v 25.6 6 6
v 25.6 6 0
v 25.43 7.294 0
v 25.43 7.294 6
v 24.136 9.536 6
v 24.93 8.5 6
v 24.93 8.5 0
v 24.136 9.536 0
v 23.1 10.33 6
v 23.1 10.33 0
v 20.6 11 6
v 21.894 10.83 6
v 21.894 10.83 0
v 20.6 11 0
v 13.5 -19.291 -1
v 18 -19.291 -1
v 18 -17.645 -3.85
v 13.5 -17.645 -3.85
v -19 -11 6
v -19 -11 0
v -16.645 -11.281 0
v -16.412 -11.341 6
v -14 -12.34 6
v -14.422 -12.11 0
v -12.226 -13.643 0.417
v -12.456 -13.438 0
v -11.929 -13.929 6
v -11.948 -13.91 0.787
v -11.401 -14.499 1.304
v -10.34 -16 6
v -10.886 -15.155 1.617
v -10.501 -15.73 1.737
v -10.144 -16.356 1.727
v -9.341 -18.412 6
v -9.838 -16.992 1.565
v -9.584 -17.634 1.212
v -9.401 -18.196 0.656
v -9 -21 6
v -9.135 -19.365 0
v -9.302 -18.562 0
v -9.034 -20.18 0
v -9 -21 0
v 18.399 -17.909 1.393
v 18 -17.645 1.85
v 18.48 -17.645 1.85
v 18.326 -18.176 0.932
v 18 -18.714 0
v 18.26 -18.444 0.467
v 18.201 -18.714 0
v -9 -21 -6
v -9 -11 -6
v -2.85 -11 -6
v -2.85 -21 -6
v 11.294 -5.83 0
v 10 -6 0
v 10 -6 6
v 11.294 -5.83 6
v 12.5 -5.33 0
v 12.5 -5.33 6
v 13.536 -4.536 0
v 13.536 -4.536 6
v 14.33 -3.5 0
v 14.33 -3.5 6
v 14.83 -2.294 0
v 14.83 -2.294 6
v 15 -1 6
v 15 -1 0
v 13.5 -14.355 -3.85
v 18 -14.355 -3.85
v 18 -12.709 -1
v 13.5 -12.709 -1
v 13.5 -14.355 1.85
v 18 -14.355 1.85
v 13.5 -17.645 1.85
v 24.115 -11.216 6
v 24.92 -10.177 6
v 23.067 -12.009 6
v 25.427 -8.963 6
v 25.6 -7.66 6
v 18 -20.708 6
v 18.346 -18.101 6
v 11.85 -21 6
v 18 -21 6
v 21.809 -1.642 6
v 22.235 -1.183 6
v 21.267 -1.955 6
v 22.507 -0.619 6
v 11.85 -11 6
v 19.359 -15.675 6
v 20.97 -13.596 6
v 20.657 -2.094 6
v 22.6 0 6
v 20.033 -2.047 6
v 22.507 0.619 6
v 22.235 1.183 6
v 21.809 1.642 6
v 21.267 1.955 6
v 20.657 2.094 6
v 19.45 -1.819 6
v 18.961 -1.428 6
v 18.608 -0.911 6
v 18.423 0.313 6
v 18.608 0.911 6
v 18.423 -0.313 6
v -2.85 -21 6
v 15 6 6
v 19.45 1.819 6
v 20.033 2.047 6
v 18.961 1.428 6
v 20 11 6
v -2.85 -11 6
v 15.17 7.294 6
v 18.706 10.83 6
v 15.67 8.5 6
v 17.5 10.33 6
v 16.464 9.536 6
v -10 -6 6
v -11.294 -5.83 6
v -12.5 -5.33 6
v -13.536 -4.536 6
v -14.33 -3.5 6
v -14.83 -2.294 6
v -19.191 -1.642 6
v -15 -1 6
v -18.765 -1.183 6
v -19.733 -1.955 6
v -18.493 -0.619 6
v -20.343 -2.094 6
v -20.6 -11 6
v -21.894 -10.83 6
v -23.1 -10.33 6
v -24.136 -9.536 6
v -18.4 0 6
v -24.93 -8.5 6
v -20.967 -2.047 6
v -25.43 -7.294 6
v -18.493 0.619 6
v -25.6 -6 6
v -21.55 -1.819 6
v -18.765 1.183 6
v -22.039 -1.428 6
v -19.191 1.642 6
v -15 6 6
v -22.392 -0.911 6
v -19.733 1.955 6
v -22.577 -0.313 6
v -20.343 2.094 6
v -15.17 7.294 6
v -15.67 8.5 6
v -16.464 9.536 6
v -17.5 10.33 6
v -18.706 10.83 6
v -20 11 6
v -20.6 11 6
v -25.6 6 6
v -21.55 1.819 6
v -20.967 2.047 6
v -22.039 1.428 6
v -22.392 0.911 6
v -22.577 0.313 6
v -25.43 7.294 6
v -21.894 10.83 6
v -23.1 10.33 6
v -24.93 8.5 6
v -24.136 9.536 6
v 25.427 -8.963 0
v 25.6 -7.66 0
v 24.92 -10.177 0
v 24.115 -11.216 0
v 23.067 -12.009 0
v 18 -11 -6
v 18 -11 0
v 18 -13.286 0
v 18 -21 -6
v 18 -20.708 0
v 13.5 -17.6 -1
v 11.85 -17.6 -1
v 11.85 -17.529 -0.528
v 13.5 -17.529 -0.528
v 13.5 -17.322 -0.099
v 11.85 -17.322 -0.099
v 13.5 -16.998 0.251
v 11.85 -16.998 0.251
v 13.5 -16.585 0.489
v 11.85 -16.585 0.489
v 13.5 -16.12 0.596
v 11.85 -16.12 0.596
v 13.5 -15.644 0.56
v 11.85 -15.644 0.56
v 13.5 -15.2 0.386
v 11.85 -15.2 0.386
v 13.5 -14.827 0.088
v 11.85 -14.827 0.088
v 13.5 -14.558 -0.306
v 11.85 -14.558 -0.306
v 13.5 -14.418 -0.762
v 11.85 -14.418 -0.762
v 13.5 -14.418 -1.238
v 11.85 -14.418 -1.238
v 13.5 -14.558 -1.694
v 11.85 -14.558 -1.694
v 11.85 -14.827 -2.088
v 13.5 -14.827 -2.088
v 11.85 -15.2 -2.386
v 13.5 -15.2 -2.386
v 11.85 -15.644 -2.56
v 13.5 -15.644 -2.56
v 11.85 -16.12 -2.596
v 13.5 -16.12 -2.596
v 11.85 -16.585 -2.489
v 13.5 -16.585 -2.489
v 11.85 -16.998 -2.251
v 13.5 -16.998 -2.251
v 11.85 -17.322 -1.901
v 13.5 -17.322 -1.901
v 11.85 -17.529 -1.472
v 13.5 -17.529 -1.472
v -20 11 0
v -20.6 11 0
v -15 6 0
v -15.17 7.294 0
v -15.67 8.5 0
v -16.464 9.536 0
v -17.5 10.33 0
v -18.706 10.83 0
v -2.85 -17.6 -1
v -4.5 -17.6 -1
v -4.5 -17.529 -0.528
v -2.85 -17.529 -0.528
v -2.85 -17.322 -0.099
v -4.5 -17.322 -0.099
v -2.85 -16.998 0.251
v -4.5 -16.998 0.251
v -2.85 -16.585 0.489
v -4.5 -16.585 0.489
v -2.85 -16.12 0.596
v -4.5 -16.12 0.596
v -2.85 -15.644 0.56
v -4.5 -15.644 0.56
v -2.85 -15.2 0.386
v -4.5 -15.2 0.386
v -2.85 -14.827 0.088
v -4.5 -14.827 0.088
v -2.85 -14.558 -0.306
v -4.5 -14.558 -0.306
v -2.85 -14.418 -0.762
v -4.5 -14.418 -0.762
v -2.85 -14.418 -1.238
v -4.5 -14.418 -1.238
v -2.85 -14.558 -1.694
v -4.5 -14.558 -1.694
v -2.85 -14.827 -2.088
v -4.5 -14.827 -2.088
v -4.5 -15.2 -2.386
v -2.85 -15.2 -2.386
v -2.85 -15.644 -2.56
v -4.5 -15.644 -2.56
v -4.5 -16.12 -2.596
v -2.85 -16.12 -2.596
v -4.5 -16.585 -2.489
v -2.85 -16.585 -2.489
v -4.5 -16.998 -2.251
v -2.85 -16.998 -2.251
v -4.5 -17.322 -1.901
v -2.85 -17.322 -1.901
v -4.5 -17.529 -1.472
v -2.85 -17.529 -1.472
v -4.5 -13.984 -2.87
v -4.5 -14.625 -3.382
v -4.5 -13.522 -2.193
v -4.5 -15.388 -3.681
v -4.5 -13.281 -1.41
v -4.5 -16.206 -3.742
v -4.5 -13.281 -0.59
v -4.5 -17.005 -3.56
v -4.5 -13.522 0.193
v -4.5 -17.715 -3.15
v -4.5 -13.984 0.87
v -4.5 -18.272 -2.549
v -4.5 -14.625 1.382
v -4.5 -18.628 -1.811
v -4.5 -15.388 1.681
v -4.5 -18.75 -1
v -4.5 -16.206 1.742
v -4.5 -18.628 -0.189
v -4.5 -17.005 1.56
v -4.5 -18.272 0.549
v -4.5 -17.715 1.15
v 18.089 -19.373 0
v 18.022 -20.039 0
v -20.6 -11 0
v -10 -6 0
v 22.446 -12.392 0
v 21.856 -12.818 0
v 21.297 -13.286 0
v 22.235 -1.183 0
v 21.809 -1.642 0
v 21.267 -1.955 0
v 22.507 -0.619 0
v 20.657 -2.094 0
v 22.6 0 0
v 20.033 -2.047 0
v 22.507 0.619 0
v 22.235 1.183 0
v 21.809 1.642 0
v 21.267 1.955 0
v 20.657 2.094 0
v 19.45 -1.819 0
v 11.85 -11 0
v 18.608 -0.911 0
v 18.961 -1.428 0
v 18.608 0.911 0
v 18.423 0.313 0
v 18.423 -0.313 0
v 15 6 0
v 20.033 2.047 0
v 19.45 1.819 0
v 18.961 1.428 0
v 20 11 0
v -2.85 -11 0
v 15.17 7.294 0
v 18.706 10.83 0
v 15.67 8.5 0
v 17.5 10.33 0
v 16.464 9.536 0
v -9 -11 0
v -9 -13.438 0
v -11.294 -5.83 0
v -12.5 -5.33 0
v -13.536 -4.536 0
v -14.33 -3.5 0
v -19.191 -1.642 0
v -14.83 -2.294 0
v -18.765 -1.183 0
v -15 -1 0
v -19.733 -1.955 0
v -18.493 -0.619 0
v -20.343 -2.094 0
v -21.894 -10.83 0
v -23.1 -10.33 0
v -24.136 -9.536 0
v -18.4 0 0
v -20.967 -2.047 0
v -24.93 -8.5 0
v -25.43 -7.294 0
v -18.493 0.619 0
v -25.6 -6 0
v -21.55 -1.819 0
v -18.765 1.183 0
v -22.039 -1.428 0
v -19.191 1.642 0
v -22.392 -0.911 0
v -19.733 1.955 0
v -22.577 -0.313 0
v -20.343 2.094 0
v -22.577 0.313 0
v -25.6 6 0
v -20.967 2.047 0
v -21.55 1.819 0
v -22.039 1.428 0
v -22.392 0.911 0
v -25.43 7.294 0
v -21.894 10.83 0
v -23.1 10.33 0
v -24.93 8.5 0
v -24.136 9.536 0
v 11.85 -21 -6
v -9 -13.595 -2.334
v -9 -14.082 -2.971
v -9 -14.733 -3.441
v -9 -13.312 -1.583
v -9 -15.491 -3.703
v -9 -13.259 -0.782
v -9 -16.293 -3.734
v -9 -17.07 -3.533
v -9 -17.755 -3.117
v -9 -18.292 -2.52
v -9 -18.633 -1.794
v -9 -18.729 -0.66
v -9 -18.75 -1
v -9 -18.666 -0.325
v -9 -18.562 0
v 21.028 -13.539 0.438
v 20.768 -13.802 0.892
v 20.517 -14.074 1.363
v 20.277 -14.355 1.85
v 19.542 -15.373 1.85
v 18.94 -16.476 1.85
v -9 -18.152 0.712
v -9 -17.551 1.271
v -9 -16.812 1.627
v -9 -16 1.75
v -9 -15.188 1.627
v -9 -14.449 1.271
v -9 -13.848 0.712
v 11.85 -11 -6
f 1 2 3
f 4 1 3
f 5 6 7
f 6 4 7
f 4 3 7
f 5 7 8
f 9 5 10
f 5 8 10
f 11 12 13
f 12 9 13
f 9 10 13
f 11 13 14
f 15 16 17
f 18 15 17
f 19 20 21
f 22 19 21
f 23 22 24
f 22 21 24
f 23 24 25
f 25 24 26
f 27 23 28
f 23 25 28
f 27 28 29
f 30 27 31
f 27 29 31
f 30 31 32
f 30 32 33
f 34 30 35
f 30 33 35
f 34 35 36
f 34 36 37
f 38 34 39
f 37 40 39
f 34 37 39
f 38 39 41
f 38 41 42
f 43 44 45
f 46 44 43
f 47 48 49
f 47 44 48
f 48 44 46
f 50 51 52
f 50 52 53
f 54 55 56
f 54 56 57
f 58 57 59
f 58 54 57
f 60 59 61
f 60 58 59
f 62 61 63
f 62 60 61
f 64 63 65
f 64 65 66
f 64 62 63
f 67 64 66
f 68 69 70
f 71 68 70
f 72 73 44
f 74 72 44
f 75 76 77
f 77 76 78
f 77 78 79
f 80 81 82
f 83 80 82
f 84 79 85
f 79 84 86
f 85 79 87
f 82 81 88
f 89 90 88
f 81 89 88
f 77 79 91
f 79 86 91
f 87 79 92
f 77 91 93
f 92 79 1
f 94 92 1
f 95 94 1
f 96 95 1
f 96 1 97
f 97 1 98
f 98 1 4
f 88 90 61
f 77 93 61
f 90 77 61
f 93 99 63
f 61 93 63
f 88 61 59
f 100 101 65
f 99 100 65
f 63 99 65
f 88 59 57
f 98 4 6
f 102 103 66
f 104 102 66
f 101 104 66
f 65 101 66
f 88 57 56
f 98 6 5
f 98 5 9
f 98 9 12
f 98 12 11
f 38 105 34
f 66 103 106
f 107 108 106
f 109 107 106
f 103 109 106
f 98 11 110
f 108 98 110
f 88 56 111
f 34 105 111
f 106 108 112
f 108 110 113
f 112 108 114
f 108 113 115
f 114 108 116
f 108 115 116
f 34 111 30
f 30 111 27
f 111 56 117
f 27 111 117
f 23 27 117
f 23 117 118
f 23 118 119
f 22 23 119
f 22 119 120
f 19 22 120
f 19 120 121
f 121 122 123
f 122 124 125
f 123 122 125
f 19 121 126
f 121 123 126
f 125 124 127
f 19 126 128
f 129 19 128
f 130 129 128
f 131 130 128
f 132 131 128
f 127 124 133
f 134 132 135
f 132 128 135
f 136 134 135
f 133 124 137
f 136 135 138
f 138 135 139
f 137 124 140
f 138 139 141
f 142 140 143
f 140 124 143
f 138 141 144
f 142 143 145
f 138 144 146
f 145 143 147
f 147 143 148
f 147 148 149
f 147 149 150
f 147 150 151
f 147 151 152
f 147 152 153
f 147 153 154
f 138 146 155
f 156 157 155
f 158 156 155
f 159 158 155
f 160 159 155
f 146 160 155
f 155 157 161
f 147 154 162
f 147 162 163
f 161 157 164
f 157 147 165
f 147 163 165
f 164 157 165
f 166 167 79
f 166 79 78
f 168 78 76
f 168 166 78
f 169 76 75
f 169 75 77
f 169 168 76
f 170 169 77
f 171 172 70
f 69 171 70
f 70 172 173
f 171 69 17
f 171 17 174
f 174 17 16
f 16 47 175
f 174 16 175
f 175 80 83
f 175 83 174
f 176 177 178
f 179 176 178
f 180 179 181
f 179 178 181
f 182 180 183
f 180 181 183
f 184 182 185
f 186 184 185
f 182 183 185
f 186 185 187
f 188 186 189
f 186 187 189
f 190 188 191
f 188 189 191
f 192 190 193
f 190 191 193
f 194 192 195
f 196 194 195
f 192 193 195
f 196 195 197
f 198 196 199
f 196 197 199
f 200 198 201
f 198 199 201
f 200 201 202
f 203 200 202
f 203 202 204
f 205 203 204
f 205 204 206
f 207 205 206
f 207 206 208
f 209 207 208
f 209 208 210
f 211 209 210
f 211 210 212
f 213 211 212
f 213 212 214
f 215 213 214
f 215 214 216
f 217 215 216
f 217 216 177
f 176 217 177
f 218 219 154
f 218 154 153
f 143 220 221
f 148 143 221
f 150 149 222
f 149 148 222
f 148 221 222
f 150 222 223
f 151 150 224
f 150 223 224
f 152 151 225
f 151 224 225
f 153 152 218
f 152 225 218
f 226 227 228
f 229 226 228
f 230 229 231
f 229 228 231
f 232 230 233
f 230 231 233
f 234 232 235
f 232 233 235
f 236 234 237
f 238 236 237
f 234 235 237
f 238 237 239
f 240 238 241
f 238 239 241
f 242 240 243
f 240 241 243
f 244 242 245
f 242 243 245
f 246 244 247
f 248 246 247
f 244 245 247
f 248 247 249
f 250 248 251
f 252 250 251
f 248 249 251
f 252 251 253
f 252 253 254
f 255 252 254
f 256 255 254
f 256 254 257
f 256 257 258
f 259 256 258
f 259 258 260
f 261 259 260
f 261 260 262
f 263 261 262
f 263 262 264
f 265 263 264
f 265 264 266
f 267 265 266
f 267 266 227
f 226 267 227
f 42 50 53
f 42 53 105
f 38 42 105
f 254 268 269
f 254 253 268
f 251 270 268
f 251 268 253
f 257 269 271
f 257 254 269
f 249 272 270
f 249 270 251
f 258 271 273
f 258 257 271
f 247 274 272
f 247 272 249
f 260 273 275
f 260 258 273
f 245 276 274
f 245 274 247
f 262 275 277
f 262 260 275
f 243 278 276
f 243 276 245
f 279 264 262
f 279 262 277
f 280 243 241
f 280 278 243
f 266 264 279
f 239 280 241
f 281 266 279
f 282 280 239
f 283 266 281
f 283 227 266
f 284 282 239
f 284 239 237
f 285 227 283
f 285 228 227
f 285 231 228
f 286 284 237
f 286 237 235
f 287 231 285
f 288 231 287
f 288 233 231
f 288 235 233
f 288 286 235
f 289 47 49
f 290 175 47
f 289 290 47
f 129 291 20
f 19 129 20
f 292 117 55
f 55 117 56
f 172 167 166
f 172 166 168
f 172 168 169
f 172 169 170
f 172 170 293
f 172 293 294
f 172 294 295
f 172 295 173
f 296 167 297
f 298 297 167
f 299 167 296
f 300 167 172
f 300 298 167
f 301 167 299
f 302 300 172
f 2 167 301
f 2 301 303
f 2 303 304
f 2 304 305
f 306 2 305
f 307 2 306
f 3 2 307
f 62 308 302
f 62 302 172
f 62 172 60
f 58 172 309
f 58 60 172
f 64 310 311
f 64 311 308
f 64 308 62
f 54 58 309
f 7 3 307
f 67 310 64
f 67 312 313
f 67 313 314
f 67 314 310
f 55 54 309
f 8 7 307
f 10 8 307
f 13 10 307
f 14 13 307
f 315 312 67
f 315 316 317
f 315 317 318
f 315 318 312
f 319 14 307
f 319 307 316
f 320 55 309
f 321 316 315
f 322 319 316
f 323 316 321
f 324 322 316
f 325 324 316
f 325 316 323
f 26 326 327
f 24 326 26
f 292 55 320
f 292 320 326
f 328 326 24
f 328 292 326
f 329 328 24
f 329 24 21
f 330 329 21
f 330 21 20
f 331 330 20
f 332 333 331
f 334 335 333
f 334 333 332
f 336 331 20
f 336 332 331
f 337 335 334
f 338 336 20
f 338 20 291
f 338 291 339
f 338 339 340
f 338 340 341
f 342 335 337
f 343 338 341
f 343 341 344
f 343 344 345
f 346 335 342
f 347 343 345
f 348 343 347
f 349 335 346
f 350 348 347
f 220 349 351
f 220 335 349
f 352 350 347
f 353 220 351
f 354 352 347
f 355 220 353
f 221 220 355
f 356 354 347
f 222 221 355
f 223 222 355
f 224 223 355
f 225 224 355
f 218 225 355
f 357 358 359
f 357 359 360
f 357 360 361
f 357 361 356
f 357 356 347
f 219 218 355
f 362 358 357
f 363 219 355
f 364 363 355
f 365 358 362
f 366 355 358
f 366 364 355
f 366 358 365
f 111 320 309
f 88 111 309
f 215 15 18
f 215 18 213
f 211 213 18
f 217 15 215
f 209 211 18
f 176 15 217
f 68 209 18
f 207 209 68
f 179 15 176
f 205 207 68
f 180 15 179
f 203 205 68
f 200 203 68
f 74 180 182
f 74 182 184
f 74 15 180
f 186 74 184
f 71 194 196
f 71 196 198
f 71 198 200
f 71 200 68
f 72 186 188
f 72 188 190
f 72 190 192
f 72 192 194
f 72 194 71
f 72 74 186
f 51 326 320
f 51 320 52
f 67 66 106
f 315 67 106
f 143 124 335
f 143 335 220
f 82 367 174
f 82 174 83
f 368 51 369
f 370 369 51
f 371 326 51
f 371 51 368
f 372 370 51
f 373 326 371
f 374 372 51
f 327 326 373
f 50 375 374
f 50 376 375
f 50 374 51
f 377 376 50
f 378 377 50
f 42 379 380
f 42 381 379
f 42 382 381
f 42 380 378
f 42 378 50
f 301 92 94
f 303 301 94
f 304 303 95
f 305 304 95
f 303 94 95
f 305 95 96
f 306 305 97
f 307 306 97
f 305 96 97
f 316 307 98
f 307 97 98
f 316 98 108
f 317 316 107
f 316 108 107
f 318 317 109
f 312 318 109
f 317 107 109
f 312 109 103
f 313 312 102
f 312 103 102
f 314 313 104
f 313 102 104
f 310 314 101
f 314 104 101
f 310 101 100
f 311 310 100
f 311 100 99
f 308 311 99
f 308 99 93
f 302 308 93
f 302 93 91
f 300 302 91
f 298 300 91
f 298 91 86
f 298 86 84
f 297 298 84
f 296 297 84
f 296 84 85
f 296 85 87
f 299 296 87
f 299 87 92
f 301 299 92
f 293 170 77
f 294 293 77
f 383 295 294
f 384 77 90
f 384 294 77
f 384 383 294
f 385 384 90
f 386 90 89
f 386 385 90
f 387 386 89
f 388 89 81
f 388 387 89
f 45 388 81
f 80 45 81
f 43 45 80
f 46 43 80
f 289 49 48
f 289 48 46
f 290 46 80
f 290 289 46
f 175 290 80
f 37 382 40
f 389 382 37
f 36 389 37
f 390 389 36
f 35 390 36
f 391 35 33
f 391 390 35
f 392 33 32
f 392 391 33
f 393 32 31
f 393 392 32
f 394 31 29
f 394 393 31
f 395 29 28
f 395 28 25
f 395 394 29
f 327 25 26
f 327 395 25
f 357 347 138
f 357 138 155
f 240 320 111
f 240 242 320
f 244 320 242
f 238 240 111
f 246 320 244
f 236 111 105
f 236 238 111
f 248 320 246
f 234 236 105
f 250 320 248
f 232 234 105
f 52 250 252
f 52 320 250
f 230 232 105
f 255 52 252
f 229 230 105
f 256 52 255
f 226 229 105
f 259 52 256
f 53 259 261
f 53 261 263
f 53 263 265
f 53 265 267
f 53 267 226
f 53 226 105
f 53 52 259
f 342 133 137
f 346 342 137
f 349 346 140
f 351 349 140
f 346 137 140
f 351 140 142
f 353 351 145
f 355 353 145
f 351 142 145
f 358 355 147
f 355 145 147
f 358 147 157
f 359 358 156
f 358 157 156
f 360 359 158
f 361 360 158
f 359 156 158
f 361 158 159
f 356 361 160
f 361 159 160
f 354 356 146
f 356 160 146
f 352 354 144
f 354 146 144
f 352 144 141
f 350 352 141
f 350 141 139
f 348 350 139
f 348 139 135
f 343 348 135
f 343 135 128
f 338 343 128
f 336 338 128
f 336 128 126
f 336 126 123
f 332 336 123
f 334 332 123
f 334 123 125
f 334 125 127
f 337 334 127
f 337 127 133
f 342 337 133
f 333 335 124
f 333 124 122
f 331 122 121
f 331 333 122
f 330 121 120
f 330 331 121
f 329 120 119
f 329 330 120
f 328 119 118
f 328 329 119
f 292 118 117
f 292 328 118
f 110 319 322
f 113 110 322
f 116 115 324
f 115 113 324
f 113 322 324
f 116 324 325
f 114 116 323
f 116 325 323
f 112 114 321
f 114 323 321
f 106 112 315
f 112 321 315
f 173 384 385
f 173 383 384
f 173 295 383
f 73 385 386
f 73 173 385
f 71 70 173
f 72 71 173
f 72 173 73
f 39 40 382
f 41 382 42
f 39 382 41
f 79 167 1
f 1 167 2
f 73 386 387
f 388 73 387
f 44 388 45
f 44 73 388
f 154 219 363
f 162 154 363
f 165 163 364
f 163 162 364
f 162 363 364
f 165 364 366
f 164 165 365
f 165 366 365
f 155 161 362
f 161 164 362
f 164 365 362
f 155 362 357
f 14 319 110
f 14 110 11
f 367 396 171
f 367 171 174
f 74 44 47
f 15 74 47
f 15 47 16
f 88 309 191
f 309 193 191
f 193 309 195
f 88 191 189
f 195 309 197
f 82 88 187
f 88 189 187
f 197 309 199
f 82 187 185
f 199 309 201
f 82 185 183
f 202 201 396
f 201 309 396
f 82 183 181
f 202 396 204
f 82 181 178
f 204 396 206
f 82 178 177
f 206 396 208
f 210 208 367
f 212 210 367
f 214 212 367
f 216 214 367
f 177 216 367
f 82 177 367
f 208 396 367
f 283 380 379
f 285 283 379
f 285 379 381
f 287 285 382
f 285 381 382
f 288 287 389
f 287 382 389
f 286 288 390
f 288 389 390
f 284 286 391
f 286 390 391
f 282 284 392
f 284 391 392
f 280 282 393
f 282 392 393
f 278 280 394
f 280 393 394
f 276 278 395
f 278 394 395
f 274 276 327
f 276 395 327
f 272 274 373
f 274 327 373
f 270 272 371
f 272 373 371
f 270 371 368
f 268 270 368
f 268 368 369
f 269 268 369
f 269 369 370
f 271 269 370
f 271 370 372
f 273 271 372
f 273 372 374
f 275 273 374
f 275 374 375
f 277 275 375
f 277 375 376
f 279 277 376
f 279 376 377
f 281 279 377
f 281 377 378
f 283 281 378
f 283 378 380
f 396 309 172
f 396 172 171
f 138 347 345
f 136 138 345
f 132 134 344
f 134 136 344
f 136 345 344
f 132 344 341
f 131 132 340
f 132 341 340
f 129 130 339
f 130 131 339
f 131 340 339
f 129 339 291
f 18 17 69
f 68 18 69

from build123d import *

# Parameters (mm, degrees)
F0_W           = 51.2
F0_H           = 22
F1_DEPTH       = 6
F2_R           = 2.1
F3_DEPTH       = 6.001
F5_DEPTH       = 6.001
F8_DEPTH       = 13.5
F9_W           = 14.7
F9_H           = 10
F10_DEPTH      = 12.001
F11_T1_DEPTH   = 6
F12_R          = 1.6
F13_DEPTH      = 34.601
F13_DEPTH_BACK = 16.601
F14_R          = 2.75
F15_DEPTH      = 4.5
F15_DEPTH_BACK = 16.601
F17_DEPTH      = 4.5
F17_DEPTH_BACK = 25
F18_W          = 30
F18_H          = 17
F19_DEPTH      = 12.001
F20_T1_DEPTH   = 6
F20_T3_DEPTH   = 31
F20_T5_DEPTH   = 22.6993813232


# Not quite as in the source:
# - a fillet or chamfer that OpenCascade refuses, or shapes differently, is made with other operations: its cross-section is extruded or revolved along the edge and cut away or added


with BuildPart() as f1:
    # F0 (on Top) → F1 (new body)
    with BuildSketch(Plane.XY):
        Rectangle(F0_W, F0_H)
    extrude(amount=F1_DEPTH)

    # F2 (on face) → F3 (cut, through all)
    with BuildSketch(Plane.XY.offset(6)):
        with Locations((-20.5, 0)):
            Circle(F2_R)
        with Locations((20.5, 0)):
            Circle(F2_R)
    extrude(amount=-F3_DEPTH, mode=Mode.SUBTRACT)

    # F4 (on face) → F5 (cut, through all)
    with BuildSketch(Plane.XY.offset(6)):
        with BuildLine():
            Line((-1.5, 11), (-1.5, 0))
            ThreePointArc((-1.5, 0), (4.5, -6), (10.5, 0))
            Line((10.5, 0), (10.5, 11))
            Line((10.5, 11), (-1.5, 11))
        make_face()
    extrude(amount=-F5_DEPTH, mode=Mode.SUBTRACT)

    # F7 (on mid) → F8 (join, symmetric)
    with BuildSketch(Plane(origin=(4.5, 0, 0), x_dir=(0, -1, 0), z_dir=(-1, 0, 0))):
        Polygon((21, 6), (11, 6), (11, 0), (11, -6), (21, -6), align=None)
    extrude(amount=F8_DEPTH, both=True)

    # F9 (on face) → F10 (cut, through all)
    with BuildSketch(Plane(origin=(0, 0, -6), x_dir=(1, 0, 0), z_dir=(0, 0, -1))):
        with Locations((4.5, 16)):
            Rectangle(F9_W, F9_H)
    extrude(amount=-F10_DEPTH, mode=Mode.SUBTRACT)

    # F11: fillet of radius 10 on 2 edges, made by hand

    # F11_s2 → F11_t1 (join)
    with BuildSketch(Plane.XY):
        with BuildLine():
            ThreePointArc((-19, -11), (-11.9289321881, -13.9289321881), (-9, -21))
            Line((-9, -21), (-9, -11))
            Line((-9, -11), (-19, -11))
        make_face()
        with BuildLine():
            ThreePointArc((25.6, -11), (20.125992126, -14.5433148766), (18, -20.7077288796))
            Line((18, -20.7077288796), (18, -11))
            Line((18, -11), (25.6, -11))
        make_face()
    extrude(amount=F11_T1_DEPTH)

    # F12 (on face) → F13 (cut, two sides)
    with BuildSketch(Plane(origin=(-9, 0, 0), x_dir=(0, -1, 0), z_dir=(-1, 0, 0))) as f13_sk:
        with Locations((16, -1)):
            Circle(F12_R)
    extrude(amount=-F13_DEPTH, mode=Mode.SUBTRACT)
    extrude(f13_sk.sketch, amount=F13_DEPTH_BACK, mode=Mode.SUBTRACT)

    # F14 (on face) → F15 (cut, two sides)
    with BuildSketch(Plane(origin=(-9, 0, 0), x_dir=(0, -1, 0), z_dir=(-1, 0, 0))) as f15_sk:
        with Locations((16, -1)):
            Circle(F14_R)
    extrude(amount=-F15_DEPTH, mode=Mode.SUBTRACT)
    extrude(f15_sk.sketch, amount=F15_DEPTH_BACK, mode=Mode.SUBTRACT)

    # F16 (on face) → F17 (cut, two sides)
    with BuildSketch(Plane.YZ.offset(18)) as f17_sk:
        Polygon((-14.3545517328, -3.85), (-12.7091034656, -1), (-14.3545517328, 1.85), (-17.6454482672, 1.85), (-19.2908965344, -1), (-17.6454482672, -3.85), align=None)
    extrude(amount=-F17_DEPTH, mode=Mode.SUBTRACT)
    extrude(f17_sk.sketch, amount=F17_DEPTH_BACK, mode=Mode.SUBTRACT)

    # F18 (on face) → F19 (cut, through all)
    with BuildSketch(Plane.XY.offset(6)):
        with Locations((0, 2.5)):
            Rectangle(F18_W, F18_H)
    extrude(amount=-F19_DEPTH, mode=Mode.SUBTRACT)

    # F20: fillet of radius 5 on 9 edges, made by hand

    # F20_s2 → F20_t1 (join)
    with BuildSketch(Plane.XY):
        with BuildLine():
            ThreePointArc((-15, -1), (-13.5355339059, -4.5355339059), (-10, -6))
            Line((-10, -6), (-15, -6))
            Line((-15, -6), (-15, -1))
        make_face()
        with BuildLine():
            ThreePointArc((10, -6), (13.5355339059, -4.5355339059), (15, -1))
            Line((15, -1), (15, -6))
            Line((15, -6), (10, -6))
        make_face()
    extrude(amount=F20_T1_DEPTH)

    # F20_s4 → F20_t3 (cut)
    with BuildSketch(Plane.XY.offset(-12.5)):
        with BuildLine():
            ThreePointArc((-25.6, -6), (-24.1355339059, -9.5355339059), (-20.6, -11))
            Line((-20.6, -11), (-25.6, -11))
            Line((-25.6, -11), (-25.6, -6))
        make_face()
        with BuildLine():
            ThreePointArc((25.6, 6), (24.1355339059, 9.5355339059), (20.6, 11))
            Line((20.6, 11), (25.6, 11))
            Line((25.6, 11), (25.6, 6))
        make_face()
        with BuildLine():
            ThreePointArc((20, 11), (16.4644660941, 9.5355339059), (15, 6))
            Line((15, 6), (15, 11))
            Line((15, 11), (20, 11))
        make_face()
        with BuildLine():
            ThreePointArc((-20.6, 11), (-24.1355339059, 9.5355339059), (-25.6, 6))
            Line((-25.6, 6), (-25.6, 11))
            Line((-25.6, 11), (-20.6, 11))
        make_face()
        with BuildLine():
            ThreePointArc((-15, 6), (-16.4644660941, 9.5355339059), (-20, 11))
            Line((-20, 11), (-15, 11))
            Line((-15, 11), (-15, 6))
        make_face()
    extrude(amount=F20_T3_DEPTH, mode=Mode.SUBTRACT)

    # F20_s6 → F20_t5 (cut)
    with BuildSketch(Plane.XY.offset(-8.3496906616)):
        with BuildLine():
            ThreePointArc((25.6, -7.6601237354), (24.9204937989, -10.1767352138), (23.0666666667, -12.0093254501))
            ThreePointArc((23.0666666667, -12.0093254501), (24.298766569, -11.4179026654), (25.6, -11))
            Line((25.6, -11), (25.6, -7.6601237354))
        make_face()
    extrude(amount=F20_T5_DEPTH, mode=Mode.SUBTRACT)


solid = f1.part
